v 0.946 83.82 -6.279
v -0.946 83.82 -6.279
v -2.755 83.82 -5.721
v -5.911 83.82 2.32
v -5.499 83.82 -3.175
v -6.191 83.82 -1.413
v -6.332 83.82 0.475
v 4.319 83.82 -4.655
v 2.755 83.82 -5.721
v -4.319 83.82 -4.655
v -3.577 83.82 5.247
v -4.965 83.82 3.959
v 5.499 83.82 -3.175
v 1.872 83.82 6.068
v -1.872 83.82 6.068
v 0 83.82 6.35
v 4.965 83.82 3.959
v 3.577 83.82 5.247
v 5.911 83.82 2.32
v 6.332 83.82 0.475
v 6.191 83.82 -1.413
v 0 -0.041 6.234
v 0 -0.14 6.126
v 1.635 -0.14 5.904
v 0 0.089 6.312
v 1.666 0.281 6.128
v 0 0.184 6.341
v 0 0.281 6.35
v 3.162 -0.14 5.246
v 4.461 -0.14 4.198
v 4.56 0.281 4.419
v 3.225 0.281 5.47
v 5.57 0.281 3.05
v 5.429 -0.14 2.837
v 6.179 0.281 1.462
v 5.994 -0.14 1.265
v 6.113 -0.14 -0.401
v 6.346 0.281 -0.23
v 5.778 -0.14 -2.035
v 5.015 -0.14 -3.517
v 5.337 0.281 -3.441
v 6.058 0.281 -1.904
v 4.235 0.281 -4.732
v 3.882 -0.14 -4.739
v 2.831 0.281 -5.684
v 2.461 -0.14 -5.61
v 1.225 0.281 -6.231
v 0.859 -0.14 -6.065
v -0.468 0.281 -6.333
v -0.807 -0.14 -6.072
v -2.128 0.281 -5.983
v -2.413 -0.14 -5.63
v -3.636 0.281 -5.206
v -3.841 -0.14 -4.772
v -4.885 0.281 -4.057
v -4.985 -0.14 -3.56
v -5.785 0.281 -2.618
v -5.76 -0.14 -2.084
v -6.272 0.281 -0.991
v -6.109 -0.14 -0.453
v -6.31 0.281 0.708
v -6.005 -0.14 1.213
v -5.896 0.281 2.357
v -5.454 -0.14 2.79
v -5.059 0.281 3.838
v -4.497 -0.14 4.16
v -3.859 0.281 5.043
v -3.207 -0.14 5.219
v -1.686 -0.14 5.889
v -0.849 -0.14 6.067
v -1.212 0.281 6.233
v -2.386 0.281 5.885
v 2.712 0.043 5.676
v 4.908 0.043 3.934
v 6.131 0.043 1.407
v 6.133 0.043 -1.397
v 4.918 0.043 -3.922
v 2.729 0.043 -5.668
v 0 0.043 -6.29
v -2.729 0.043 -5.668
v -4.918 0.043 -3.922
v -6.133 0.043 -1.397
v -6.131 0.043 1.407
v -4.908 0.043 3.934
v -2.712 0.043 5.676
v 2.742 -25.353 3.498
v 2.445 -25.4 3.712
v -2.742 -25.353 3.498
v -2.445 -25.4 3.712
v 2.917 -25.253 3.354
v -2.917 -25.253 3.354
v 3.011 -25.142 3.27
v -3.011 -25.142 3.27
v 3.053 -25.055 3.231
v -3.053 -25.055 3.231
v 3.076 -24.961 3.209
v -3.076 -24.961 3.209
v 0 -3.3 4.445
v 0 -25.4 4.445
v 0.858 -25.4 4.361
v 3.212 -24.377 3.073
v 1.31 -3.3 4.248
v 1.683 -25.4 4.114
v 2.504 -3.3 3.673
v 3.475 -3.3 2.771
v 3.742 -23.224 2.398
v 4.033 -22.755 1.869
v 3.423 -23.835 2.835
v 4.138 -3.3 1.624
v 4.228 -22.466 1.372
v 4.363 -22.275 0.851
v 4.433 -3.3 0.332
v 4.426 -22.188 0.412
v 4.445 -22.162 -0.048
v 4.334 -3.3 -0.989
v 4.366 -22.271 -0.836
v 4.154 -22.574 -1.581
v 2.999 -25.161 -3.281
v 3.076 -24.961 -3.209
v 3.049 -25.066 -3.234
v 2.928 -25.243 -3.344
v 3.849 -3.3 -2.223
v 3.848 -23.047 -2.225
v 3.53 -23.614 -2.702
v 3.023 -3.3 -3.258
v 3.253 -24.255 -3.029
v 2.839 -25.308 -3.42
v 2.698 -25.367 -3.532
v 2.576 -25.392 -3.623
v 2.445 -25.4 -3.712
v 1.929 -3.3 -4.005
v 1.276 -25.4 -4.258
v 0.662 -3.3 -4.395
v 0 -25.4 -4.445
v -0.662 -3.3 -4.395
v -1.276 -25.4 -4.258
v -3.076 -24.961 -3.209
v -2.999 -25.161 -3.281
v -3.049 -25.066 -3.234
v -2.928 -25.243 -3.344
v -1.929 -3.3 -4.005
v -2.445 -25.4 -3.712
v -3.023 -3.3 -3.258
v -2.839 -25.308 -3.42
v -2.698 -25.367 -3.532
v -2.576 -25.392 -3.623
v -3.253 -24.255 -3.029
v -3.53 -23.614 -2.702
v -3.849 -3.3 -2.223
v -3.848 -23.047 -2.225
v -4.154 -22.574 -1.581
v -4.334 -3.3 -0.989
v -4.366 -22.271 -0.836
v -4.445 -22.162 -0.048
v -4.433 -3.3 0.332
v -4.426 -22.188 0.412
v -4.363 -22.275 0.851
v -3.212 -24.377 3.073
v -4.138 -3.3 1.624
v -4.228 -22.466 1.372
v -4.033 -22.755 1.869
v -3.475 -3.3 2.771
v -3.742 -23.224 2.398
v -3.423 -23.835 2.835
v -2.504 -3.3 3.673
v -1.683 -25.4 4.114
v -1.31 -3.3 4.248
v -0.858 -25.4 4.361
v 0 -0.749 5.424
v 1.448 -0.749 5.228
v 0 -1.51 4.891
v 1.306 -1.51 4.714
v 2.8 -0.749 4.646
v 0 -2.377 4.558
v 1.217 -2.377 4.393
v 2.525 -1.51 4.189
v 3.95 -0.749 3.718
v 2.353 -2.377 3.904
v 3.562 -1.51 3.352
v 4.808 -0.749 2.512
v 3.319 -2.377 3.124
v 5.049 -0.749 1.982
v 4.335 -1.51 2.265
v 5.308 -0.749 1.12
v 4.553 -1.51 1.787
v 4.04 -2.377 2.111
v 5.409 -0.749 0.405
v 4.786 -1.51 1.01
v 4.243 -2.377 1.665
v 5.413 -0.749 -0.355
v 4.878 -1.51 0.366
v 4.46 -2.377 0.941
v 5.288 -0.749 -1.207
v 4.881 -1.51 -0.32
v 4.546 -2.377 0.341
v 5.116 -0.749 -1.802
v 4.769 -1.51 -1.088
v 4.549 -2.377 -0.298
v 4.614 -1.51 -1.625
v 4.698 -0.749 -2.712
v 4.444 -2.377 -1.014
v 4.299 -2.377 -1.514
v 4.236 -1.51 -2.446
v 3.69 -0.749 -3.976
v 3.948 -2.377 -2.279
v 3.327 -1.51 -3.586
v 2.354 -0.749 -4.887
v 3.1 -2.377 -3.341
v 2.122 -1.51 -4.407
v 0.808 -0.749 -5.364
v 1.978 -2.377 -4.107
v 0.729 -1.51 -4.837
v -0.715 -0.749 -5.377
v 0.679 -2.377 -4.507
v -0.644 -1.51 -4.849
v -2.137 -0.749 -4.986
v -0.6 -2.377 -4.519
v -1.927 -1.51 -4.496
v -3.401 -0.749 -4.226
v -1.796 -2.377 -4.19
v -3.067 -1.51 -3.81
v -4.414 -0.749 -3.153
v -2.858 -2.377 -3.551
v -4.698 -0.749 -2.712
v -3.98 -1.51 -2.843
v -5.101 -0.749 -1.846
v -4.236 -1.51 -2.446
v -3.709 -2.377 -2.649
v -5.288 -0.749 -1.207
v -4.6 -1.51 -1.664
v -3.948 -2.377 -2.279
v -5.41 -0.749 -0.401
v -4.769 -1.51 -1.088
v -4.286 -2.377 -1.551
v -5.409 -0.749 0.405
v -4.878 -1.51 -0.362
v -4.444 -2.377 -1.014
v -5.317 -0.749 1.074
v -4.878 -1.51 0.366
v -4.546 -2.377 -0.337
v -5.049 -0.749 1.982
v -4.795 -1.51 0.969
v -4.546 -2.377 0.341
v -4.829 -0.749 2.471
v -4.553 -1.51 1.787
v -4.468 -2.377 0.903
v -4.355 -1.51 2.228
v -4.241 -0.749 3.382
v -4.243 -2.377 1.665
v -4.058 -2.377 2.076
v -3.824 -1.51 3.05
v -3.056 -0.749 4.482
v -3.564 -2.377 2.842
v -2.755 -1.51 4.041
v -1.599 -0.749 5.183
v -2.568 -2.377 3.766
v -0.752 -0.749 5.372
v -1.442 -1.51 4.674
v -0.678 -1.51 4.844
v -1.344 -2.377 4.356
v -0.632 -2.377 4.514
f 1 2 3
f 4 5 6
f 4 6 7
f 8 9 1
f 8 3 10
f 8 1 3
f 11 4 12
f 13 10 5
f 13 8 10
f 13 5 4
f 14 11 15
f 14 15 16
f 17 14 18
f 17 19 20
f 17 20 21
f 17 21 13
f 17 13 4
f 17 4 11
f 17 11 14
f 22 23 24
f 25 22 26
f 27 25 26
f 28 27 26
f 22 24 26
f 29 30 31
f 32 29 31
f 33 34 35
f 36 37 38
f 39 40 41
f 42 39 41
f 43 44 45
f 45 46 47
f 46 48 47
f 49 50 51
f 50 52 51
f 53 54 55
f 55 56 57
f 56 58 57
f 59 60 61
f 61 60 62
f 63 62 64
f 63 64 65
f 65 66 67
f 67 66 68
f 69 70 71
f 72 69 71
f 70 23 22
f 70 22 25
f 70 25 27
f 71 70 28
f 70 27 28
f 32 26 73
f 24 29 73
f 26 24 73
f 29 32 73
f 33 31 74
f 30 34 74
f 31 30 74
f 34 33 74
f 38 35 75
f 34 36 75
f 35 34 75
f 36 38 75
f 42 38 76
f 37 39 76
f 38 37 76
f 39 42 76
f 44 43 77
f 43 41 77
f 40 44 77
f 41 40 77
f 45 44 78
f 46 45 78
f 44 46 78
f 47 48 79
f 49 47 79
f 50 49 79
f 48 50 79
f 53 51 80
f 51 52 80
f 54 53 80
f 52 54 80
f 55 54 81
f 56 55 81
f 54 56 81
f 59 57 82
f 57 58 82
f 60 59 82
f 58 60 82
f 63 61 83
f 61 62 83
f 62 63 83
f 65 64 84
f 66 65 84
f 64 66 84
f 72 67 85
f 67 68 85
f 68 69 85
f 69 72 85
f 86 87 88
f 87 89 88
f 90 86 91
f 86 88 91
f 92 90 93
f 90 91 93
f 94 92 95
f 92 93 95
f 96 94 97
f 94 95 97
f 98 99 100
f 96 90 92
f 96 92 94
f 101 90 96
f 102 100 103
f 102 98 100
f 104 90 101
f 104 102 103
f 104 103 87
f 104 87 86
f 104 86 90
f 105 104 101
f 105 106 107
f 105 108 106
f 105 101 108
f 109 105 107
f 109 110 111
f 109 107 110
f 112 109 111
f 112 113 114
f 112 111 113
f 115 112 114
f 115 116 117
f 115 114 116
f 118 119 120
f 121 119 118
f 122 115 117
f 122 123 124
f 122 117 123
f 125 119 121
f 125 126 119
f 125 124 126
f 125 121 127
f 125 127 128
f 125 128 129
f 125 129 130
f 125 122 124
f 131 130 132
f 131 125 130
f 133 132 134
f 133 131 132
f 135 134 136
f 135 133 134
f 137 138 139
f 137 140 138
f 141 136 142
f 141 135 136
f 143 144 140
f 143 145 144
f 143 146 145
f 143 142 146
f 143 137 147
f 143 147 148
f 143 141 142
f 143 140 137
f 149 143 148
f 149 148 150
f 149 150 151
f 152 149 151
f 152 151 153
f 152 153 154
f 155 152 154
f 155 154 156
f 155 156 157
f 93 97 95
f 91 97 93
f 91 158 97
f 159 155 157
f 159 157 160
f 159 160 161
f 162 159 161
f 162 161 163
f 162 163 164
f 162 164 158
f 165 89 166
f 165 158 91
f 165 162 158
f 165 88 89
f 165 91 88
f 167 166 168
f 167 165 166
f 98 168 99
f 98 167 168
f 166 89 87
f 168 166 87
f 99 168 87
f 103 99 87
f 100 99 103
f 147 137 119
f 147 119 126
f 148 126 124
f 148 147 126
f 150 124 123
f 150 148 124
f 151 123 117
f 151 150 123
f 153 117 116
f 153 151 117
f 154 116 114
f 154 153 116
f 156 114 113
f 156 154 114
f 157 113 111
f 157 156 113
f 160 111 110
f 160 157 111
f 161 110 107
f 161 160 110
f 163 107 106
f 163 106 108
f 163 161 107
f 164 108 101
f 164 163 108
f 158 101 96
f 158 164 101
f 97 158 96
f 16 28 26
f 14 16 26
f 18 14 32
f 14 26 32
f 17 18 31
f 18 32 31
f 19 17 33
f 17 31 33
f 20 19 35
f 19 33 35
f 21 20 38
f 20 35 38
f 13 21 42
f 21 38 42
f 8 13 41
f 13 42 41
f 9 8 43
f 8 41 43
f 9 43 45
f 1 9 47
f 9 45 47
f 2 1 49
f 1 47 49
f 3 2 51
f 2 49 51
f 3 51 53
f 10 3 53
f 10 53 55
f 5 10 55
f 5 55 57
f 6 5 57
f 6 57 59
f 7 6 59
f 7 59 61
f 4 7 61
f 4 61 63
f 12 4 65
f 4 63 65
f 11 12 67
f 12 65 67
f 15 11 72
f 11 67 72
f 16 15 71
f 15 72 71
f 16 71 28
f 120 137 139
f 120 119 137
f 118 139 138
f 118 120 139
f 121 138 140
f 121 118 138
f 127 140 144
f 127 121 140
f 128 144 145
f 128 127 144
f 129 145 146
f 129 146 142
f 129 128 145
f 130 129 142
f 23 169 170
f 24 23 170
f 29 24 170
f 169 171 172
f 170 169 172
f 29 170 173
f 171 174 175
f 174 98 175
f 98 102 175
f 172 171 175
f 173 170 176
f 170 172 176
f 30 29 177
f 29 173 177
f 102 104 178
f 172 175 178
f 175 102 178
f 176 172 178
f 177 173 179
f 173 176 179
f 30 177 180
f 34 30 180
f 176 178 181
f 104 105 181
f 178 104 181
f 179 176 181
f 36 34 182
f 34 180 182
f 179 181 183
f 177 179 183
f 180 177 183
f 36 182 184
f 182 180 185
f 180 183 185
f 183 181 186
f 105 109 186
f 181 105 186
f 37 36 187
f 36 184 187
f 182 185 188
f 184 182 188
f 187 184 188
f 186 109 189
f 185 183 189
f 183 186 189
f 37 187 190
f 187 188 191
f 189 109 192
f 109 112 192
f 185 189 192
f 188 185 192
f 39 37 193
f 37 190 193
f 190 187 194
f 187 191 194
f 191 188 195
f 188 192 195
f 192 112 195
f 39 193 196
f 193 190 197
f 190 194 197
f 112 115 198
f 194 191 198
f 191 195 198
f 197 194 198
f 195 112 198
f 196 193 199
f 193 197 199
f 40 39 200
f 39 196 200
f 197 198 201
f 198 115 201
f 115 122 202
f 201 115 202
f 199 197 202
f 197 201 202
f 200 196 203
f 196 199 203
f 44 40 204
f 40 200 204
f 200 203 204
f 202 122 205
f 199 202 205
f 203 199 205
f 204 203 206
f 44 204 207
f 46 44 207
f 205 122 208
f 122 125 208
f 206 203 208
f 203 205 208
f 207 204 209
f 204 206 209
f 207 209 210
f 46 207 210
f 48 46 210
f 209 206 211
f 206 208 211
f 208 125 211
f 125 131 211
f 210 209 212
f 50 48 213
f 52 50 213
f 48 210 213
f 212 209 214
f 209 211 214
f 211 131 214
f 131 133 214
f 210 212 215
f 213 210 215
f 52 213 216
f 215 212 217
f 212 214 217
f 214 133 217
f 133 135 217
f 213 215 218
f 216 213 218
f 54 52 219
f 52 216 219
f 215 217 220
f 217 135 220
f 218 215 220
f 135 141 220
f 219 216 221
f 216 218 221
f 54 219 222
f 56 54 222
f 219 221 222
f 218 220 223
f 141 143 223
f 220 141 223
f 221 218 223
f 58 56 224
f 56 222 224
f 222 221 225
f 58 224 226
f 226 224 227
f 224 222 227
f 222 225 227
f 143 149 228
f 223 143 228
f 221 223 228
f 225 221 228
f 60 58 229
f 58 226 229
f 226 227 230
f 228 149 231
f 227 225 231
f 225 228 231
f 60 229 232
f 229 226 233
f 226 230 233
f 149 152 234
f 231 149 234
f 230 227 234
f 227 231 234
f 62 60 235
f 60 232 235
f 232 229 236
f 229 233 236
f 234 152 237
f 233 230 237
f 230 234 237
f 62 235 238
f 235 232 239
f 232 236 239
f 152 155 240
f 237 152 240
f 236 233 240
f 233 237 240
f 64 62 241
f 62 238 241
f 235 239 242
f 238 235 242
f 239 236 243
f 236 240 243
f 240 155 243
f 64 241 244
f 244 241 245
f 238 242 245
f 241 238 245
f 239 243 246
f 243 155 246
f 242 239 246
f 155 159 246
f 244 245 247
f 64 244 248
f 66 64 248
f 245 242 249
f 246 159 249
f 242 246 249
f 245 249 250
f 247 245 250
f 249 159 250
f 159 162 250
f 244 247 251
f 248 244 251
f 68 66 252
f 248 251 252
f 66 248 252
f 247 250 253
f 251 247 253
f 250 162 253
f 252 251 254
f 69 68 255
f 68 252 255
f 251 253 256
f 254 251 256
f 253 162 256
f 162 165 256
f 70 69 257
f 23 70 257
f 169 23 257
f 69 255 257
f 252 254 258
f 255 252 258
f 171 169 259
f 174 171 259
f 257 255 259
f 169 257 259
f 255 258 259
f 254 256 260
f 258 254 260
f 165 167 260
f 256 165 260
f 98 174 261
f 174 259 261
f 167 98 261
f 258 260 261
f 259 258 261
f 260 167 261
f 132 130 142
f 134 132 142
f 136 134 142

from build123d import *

# Parameters (mm, degrees)
SKETCH1_R               = 6.35
BOSS_EXTRUDE1_DEPTH     = 83.82
SKETCH3_R               = 4.445
BOSS_EXTRUDE2_DEPTH     = 25.4
FILLET1_R               = 3.81
CUT_EXTRUDE1_DEPTH      = 7.62
CUT_EXTRUDE1_DEPTH_BACK = 7.62
SKETCH4_R               = 3.2385
FILLET2_R               = 0.508


with BuildPart() as part:
    # Sketch1 → Boss-Extrude1 (new body)
    with BuildSketch(Plane(origin=(0, 0, 0), x_dir=(1, 0, 0), z_dir=(0, 1, 0))):
        with Locations(Location((0, 0, 0), (0, 0, 270))):
            Circle(SKETCH1_R)
    extrude(amount=BOSS_EXTRUDE1_DEPTH)

    # Sketch3 → Boss-Extrude2 (add)
    with BuildSketch(Plane(origin=(0, 0, 0), x_dir=(1, 0, 0), z_dir=(0, 1, 0))):
        with Locations(Location((0, 0, 0), (0, 0, 270))):
            Circle(SKETCH3_R)
    extrude(amount=-BOSS_EXTRUDE2_DEPTH)

    # Fillet1
    # the kernel refuses this fillet: 3.81 mm, written as the material it adds along each edge
    with BuildSketch(Plane(origin=(0, 0, 0), x_dir=(0, 0, 1), z_dir=(-1, 0, 0))) as fillet1_piece_1:
        with BuildLine():
            CenterArc((8.255, -3.299556788), FILLET1_R, 120, 60)
            Line((4.445, -3.299556788), (4.3688, -3.299556788))
            Line((4.3688, -3.299556788), (4.3688, 0))
            Line((4.3688, 0), (4.445, 0.0762))
            ThreePointArc((4.445, 0.0762), (5.3975, 0.0762), (6.3119, 0.065991136))
            Line((6.3119, 0.065991136), (6.35, 0))
        make_face()
    revolve(axis=Axis((0, 0, 0), (0, 1, 0)))

    # Sketch4 → Cut-Extrude1 (cut, two sides: drawn at the far end of the back side and taken through both)
    with BuildSketch(Plane(origin=(0, 0, 0), x_dir=(0, 0, -1), z_dir=(1, 0, 0)).offset(-CUT_EXTRUDE1_DEPTH_BACK)):
        with Locations((0, -25.4)):
            Circle(SKETCH4_R)
    extrude(amount=CUT_EXTRUDE1_DEPTH + CUT_EXTRUDE1_DEPTH_BACK, mode=Mode.SUBTRACT)

    # Fillet2
    fillet2_edges = [part.edges().sort_by_distance(p)[0] for p in [
        (0, -25.4, -3.2385),
        (0, -25.4, 3.2385),
        (0, 0, -6.35),
    ]]
    fillet(fillet2_edges, radius=FILLET2_R)


solid = part.part
